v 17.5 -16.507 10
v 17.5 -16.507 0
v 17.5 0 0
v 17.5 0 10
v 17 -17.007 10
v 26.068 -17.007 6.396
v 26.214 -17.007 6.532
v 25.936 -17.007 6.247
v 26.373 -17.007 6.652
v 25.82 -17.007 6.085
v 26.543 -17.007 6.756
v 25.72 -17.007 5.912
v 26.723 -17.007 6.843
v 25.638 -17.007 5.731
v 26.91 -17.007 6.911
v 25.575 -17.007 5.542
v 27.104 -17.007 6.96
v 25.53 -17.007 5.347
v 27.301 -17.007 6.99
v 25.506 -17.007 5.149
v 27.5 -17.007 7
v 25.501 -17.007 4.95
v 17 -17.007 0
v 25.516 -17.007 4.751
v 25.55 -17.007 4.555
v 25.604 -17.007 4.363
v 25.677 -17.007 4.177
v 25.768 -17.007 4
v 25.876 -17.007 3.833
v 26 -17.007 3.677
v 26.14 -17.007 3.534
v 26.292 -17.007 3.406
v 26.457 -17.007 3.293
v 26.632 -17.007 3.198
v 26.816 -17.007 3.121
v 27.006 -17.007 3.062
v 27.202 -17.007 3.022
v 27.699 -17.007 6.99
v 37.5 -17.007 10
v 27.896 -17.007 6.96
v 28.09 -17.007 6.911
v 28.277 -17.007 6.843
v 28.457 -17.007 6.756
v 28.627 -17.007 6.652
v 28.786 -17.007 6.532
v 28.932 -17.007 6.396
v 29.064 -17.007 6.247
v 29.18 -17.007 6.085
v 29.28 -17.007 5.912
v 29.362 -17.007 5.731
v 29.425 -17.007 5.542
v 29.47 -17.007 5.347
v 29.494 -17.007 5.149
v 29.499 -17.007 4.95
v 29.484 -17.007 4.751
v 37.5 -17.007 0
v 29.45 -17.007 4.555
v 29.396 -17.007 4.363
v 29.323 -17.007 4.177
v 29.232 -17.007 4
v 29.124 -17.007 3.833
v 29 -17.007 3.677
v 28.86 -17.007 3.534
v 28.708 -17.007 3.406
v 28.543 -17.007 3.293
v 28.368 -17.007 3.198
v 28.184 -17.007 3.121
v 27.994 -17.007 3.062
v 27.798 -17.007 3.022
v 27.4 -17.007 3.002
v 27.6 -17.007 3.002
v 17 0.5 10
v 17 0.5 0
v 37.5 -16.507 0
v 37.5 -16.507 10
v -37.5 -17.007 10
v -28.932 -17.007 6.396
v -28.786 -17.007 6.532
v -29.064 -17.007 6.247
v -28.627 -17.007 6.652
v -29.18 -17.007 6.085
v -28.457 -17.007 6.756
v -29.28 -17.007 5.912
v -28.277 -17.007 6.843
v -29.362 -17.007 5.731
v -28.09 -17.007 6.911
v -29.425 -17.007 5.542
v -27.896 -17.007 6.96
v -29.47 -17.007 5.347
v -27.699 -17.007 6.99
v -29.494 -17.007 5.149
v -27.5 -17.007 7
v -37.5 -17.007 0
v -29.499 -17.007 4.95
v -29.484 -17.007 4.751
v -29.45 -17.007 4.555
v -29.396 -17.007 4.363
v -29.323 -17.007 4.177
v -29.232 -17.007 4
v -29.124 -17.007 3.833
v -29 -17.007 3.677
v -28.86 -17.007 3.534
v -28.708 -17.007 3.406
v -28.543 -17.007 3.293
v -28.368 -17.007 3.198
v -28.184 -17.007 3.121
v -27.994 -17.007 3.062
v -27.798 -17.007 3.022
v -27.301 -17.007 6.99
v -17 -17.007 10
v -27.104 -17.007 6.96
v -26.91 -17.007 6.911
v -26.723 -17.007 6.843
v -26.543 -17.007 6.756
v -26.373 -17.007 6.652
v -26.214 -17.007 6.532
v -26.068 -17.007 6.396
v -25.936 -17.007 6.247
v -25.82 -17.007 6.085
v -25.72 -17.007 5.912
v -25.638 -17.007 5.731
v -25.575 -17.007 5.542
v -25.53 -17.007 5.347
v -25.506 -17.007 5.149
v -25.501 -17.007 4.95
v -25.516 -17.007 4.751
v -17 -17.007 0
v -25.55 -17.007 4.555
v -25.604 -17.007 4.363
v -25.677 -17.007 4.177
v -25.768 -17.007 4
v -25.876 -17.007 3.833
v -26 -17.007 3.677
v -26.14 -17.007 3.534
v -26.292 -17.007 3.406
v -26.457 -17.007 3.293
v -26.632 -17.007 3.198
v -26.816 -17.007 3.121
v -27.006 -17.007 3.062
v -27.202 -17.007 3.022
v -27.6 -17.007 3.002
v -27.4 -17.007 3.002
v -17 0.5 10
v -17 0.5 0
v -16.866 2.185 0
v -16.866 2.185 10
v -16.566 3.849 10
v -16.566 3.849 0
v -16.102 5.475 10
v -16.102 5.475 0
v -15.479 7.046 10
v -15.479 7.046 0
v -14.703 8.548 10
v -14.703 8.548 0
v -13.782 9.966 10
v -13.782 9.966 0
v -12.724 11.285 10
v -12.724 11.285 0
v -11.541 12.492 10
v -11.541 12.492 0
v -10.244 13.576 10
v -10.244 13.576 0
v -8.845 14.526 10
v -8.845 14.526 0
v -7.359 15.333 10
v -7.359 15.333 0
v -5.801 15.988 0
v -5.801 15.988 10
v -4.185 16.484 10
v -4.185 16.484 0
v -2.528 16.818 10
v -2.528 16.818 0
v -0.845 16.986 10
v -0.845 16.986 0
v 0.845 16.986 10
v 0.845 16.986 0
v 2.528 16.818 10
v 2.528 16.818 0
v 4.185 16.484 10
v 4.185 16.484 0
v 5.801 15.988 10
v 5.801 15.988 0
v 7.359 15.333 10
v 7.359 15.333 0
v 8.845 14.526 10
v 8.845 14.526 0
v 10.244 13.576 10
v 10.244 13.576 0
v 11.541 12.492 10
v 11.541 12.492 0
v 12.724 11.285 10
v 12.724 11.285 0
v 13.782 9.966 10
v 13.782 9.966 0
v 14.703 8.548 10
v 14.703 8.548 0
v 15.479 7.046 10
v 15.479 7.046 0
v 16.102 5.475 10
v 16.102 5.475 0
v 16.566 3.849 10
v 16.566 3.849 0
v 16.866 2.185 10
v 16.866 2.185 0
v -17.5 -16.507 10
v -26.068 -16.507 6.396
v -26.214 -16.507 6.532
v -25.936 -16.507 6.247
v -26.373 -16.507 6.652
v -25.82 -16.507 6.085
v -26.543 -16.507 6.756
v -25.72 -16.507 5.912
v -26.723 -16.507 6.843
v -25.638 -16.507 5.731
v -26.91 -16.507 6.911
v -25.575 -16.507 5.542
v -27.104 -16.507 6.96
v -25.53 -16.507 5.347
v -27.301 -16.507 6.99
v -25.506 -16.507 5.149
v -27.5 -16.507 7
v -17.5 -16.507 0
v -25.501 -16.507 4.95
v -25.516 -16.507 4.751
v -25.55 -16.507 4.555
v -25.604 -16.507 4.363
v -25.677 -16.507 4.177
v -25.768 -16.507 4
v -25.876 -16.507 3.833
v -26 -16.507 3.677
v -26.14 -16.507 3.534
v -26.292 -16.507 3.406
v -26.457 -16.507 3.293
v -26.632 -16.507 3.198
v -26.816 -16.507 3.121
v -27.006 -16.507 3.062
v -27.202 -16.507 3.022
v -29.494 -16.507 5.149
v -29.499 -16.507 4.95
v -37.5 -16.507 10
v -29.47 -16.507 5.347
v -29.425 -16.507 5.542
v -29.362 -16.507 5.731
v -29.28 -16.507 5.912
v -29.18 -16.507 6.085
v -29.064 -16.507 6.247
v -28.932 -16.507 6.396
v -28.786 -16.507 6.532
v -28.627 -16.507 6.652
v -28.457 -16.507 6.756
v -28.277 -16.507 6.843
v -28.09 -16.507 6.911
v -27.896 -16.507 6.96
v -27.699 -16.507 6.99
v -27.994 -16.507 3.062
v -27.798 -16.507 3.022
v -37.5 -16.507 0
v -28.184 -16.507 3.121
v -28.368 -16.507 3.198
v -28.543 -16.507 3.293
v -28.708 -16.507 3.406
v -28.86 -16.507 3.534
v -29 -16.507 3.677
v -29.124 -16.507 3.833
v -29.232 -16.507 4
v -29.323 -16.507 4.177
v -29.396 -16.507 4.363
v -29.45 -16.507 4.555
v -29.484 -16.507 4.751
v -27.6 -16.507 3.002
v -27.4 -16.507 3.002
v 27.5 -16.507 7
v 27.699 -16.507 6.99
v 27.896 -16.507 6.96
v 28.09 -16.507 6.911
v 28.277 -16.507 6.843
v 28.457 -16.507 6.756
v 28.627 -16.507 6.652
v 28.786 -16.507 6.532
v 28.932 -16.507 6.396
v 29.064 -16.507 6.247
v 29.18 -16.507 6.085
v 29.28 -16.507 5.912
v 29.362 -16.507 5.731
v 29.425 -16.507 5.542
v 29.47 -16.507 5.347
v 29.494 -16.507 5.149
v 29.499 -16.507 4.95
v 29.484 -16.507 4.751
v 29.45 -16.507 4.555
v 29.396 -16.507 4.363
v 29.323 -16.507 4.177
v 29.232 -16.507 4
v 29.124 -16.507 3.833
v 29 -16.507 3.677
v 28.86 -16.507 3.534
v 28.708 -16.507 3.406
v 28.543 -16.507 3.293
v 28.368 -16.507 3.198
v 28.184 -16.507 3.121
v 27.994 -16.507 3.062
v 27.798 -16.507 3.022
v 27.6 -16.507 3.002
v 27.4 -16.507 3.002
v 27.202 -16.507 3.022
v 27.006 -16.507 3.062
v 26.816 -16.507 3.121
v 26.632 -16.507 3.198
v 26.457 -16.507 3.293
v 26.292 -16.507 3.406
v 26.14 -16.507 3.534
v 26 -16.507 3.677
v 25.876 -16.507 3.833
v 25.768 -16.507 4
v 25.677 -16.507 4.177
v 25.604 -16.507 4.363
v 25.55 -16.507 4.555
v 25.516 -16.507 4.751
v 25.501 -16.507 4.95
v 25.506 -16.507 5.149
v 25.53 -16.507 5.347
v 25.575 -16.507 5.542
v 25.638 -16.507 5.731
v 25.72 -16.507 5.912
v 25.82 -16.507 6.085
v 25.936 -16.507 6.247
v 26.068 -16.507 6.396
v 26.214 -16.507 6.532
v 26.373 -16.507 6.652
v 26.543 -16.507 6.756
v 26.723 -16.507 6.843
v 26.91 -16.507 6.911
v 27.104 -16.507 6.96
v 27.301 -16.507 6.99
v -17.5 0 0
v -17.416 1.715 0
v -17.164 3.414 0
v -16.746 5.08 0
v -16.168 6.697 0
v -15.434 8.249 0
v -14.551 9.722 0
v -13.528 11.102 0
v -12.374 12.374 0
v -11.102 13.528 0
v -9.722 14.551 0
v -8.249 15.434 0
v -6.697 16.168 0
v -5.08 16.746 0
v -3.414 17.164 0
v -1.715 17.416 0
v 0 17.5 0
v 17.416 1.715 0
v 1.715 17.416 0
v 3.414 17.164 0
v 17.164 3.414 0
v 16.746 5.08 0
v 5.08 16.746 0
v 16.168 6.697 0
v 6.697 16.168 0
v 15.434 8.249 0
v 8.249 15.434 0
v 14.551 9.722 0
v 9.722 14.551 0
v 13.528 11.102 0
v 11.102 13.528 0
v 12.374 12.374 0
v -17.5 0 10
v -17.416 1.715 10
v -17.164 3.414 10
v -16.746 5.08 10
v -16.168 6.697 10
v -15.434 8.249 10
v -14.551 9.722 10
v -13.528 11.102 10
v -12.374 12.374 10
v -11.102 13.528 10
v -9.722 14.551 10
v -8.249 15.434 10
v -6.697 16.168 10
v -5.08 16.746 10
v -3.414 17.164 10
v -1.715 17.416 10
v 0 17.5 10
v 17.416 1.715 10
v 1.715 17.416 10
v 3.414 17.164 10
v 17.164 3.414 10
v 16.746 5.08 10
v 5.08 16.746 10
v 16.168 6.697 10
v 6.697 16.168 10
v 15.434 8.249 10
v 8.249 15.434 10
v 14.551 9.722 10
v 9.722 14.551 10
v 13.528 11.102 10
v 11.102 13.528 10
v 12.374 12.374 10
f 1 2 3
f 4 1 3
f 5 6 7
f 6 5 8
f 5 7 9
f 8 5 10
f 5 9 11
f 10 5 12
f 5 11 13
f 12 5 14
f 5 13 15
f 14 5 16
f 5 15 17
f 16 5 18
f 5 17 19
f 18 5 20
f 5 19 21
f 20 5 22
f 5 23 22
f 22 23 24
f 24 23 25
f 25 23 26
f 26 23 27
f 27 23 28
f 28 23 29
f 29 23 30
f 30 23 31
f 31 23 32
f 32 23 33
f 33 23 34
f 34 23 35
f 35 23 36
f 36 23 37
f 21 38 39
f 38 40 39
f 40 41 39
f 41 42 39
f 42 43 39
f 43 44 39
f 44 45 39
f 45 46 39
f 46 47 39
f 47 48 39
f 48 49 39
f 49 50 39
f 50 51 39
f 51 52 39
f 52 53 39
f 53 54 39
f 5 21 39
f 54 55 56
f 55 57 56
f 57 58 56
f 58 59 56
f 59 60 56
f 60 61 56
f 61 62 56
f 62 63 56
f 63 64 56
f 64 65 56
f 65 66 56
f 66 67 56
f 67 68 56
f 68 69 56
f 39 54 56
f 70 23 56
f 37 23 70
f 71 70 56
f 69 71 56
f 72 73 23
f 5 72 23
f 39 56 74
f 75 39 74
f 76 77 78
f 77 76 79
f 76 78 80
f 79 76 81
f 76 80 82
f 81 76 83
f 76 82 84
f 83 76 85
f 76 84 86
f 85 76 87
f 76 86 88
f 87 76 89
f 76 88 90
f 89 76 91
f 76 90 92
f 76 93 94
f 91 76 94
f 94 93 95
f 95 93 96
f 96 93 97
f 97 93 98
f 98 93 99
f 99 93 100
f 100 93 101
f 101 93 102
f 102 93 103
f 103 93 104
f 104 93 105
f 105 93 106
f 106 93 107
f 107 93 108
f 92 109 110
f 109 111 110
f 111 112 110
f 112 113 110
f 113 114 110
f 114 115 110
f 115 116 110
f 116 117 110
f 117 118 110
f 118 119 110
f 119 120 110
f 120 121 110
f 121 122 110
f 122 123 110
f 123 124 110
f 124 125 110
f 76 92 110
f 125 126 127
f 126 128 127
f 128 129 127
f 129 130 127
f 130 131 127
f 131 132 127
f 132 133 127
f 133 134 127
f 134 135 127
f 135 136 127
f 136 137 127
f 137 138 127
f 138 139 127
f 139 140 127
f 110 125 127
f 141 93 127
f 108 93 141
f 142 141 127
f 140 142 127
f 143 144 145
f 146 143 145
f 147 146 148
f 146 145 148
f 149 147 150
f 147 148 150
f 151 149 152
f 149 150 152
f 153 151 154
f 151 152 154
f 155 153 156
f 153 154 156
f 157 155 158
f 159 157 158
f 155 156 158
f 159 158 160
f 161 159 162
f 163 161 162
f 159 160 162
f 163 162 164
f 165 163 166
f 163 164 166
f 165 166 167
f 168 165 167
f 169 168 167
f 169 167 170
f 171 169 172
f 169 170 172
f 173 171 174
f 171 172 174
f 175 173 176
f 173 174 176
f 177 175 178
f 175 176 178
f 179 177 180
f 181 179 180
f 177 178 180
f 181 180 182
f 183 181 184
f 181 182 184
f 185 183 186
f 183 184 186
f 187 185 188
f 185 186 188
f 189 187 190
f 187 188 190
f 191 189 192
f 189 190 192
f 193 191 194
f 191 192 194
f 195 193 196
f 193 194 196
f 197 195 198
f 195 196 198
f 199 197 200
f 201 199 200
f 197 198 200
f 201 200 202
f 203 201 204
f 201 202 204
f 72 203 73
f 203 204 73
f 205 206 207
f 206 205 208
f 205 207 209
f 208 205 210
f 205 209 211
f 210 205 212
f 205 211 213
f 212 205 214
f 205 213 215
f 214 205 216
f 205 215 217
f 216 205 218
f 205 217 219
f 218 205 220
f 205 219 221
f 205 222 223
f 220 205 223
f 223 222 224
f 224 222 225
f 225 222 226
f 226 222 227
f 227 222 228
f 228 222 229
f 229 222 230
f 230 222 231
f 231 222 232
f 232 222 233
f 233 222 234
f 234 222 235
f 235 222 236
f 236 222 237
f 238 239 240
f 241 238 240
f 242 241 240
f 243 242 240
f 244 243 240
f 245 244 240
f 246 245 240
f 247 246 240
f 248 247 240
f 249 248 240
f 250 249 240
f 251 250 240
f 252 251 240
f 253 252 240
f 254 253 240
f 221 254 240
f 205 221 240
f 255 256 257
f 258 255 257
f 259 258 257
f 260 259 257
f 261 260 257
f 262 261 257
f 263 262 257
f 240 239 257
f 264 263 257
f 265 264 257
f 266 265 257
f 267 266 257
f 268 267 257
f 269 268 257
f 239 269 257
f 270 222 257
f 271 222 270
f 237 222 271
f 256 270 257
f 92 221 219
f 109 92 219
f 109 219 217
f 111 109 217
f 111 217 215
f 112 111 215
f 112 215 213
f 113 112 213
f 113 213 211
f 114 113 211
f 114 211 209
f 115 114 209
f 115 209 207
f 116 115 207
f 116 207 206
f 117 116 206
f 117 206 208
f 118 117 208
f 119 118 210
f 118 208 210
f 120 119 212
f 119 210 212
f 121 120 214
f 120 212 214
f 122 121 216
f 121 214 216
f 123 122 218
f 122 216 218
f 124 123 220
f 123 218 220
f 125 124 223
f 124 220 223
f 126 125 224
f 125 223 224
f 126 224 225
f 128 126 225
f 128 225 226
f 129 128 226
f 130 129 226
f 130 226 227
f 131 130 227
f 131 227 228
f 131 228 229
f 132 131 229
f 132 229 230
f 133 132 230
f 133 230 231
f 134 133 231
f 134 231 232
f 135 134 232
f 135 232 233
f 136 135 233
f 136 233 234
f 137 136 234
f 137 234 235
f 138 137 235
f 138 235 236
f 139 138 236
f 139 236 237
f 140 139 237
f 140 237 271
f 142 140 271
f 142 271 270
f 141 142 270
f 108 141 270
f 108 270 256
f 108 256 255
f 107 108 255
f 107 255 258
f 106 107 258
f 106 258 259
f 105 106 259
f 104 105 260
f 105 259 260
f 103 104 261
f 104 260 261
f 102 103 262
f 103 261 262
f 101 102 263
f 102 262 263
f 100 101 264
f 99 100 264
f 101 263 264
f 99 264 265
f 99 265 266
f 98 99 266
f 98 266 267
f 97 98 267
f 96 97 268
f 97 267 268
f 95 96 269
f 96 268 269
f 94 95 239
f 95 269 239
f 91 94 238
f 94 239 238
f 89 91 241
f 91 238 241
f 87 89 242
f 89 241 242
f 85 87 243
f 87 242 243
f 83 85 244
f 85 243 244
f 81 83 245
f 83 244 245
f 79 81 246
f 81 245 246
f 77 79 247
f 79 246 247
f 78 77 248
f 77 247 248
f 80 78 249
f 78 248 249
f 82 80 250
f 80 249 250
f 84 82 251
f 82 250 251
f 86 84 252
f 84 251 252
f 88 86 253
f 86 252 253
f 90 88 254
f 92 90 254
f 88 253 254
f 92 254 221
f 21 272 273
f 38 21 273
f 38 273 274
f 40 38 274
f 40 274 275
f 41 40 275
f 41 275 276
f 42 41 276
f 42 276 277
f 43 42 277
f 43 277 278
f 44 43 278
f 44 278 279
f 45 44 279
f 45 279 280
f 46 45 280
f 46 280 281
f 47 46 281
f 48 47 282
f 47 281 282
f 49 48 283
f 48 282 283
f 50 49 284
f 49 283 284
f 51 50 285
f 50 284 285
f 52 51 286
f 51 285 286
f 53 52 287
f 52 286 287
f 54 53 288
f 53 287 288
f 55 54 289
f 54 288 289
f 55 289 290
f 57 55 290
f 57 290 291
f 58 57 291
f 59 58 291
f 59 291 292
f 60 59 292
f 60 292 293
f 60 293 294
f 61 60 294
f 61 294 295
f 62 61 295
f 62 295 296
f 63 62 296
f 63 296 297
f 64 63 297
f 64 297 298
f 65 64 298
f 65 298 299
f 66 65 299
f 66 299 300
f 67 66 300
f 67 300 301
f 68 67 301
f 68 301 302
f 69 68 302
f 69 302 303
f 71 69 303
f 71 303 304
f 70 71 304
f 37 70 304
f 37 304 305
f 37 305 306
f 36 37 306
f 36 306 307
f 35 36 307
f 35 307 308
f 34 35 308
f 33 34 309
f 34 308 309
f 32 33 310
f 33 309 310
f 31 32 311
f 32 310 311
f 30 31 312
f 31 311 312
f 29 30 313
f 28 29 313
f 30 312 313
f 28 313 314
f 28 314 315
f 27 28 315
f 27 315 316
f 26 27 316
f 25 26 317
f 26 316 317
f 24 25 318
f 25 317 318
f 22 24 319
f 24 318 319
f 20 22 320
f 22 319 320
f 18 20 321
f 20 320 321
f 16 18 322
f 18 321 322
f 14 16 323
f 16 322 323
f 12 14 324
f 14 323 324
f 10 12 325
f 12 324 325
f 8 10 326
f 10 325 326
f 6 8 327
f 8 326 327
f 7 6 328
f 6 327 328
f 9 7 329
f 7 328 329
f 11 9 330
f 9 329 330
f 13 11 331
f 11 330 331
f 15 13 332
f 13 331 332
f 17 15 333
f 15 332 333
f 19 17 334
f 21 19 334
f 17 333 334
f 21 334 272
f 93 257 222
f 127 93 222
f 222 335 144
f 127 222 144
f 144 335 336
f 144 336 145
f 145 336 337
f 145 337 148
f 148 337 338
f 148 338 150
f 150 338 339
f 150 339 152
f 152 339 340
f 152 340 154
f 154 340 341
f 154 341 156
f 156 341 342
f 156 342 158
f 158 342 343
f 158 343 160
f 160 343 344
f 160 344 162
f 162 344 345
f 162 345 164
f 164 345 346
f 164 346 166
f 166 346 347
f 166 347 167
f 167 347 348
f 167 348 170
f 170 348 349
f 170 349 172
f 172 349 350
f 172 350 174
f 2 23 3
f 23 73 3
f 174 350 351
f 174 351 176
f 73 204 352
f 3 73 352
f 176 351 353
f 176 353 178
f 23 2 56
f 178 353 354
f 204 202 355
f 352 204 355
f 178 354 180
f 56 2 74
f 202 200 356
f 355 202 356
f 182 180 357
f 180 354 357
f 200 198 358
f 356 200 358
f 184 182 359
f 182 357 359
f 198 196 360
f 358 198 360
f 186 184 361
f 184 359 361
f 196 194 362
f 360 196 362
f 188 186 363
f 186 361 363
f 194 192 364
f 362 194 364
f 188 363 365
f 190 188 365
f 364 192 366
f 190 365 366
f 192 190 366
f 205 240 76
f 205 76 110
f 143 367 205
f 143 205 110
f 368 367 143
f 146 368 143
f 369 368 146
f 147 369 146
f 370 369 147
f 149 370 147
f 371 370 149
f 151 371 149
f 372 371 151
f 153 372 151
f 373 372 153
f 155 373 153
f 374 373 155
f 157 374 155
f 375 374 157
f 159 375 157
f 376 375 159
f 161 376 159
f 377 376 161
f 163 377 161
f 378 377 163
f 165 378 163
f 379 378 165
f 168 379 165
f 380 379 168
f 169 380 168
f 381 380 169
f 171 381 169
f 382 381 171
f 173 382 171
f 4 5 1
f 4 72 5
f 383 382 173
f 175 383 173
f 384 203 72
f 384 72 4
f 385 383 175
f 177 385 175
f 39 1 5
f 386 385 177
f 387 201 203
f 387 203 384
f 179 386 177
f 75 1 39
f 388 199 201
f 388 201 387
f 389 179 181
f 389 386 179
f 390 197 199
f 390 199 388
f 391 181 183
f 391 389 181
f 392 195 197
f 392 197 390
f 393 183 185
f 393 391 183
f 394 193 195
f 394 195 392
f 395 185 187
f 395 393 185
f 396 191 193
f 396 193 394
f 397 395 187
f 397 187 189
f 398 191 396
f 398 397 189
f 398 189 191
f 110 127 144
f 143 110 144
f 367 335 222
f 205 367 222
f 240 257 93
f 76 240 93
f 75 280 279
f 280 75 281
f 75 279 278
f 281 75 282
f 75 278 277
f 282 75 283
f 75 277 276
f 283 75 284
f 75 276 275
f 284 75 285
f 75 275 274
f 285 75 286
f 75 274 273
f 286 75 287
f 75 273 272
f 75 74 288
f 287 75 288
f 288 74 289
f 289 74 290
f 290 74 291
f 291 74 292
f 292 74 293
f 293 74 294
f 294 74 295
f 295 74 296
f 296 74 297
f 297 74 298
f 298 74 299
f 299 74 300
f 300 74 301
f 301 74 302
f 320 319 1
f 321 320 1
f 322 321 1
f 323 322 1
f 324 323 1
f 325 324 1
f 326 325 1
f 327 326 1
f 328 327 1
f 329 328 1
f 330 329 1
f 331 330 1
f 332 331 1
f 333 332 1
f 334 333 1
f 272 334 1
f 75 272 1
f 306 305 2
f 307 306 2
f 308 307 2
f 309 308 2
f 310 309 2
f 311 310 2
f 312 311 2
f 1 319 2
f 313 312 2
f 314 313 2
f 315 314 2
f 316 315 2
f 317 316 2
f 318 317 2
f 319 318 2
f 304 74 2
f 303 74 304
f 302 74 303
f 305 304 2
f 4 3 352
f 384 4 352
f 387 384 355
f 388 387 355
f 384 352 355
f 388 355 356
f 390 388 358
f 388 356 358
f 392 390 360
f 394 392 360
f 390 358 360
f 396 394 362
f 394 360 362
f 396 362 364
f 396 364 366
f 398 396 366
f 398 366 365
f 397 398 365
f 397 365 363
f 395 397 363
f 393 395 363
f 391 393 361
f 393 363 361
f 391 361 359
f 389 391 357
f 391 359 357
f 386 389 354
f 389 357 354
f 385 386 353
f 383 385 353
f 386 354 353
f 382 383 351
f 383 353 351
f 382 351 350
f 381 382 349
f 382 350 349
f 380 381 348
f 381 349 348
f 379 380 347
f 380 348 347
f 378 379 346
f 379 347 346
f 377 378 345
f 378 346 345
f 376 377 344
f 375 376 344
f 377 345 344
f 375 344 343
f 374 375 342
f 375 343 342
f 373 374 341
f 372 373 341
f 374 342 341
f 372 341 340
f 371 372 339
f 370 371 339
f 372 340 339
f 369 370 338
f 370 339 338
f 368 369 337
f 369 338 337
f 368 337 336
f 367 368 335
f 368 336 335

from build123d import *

# Parameters (mm, degrees)
SALIENTE_EXTRUIR1_DEPTH = 10
CROQUIS2_R              = 2
CORTAR_EXTRUIR1_DEPTH   = 10


with BuildPart() as part:
    # Croquis1 → Saliente-Extruir1 (new body)
    with BuildSketch(Plane.XY):
        with BuildLine():
            Line((-17.5, 0), (-17.5, -16.507351352))
            Line((-17.5, -16.507351352), (-37.5, -16.507351352))
            Line((-37.5, -16.507351352), (-37.5, -17.007351352))
            Line((-37.5, -17.007351352), (-17, -17.007351352))
            Line((-17, -17.007351352), (-17, 0.5))
            ThreePointArc((-17, 0.5), (0, 17.007351352), (17, 0.5))
            Line((17, 0.5), (17, -17.007351352))
            Line((17, -17.007351352), (37.5, -17.007351352))
            Line((37.5, -17.007351352), (37.5, -16.507351352))
            Line((37.5, -16.507351352), (17.5, -16.507351352))
            Line((17.5, -16.507351352), (17.5, 0))
            ThreePointArc((17.5, 0), (0, 17.5), (-17.5, 0))
        make_face()
    extrude(amount=SALIENTE_EXTRUIR1_DEPTH)

    # Croquis2 → Cortar-Extruir1 (cut)
    with BuildSketch(Plane(origin=(0, -16.507351352, 0), x_dir=(1, 0, 0), z_dir=(0, 1, 0))):
        with Locations(Location((-27.5, -5, 0), (0, 0, 270))):
            Circle(CROQUIS2_R)
        with Locations(Location((27.5, -5, 0), (0, 0, 270))):
            Circle(CROQUIS2_R)
    extrude(amount=-CORTAR_EXTRUIR1_DEPTH, mode=Mode.SUBTRACT)


solid = part.part
